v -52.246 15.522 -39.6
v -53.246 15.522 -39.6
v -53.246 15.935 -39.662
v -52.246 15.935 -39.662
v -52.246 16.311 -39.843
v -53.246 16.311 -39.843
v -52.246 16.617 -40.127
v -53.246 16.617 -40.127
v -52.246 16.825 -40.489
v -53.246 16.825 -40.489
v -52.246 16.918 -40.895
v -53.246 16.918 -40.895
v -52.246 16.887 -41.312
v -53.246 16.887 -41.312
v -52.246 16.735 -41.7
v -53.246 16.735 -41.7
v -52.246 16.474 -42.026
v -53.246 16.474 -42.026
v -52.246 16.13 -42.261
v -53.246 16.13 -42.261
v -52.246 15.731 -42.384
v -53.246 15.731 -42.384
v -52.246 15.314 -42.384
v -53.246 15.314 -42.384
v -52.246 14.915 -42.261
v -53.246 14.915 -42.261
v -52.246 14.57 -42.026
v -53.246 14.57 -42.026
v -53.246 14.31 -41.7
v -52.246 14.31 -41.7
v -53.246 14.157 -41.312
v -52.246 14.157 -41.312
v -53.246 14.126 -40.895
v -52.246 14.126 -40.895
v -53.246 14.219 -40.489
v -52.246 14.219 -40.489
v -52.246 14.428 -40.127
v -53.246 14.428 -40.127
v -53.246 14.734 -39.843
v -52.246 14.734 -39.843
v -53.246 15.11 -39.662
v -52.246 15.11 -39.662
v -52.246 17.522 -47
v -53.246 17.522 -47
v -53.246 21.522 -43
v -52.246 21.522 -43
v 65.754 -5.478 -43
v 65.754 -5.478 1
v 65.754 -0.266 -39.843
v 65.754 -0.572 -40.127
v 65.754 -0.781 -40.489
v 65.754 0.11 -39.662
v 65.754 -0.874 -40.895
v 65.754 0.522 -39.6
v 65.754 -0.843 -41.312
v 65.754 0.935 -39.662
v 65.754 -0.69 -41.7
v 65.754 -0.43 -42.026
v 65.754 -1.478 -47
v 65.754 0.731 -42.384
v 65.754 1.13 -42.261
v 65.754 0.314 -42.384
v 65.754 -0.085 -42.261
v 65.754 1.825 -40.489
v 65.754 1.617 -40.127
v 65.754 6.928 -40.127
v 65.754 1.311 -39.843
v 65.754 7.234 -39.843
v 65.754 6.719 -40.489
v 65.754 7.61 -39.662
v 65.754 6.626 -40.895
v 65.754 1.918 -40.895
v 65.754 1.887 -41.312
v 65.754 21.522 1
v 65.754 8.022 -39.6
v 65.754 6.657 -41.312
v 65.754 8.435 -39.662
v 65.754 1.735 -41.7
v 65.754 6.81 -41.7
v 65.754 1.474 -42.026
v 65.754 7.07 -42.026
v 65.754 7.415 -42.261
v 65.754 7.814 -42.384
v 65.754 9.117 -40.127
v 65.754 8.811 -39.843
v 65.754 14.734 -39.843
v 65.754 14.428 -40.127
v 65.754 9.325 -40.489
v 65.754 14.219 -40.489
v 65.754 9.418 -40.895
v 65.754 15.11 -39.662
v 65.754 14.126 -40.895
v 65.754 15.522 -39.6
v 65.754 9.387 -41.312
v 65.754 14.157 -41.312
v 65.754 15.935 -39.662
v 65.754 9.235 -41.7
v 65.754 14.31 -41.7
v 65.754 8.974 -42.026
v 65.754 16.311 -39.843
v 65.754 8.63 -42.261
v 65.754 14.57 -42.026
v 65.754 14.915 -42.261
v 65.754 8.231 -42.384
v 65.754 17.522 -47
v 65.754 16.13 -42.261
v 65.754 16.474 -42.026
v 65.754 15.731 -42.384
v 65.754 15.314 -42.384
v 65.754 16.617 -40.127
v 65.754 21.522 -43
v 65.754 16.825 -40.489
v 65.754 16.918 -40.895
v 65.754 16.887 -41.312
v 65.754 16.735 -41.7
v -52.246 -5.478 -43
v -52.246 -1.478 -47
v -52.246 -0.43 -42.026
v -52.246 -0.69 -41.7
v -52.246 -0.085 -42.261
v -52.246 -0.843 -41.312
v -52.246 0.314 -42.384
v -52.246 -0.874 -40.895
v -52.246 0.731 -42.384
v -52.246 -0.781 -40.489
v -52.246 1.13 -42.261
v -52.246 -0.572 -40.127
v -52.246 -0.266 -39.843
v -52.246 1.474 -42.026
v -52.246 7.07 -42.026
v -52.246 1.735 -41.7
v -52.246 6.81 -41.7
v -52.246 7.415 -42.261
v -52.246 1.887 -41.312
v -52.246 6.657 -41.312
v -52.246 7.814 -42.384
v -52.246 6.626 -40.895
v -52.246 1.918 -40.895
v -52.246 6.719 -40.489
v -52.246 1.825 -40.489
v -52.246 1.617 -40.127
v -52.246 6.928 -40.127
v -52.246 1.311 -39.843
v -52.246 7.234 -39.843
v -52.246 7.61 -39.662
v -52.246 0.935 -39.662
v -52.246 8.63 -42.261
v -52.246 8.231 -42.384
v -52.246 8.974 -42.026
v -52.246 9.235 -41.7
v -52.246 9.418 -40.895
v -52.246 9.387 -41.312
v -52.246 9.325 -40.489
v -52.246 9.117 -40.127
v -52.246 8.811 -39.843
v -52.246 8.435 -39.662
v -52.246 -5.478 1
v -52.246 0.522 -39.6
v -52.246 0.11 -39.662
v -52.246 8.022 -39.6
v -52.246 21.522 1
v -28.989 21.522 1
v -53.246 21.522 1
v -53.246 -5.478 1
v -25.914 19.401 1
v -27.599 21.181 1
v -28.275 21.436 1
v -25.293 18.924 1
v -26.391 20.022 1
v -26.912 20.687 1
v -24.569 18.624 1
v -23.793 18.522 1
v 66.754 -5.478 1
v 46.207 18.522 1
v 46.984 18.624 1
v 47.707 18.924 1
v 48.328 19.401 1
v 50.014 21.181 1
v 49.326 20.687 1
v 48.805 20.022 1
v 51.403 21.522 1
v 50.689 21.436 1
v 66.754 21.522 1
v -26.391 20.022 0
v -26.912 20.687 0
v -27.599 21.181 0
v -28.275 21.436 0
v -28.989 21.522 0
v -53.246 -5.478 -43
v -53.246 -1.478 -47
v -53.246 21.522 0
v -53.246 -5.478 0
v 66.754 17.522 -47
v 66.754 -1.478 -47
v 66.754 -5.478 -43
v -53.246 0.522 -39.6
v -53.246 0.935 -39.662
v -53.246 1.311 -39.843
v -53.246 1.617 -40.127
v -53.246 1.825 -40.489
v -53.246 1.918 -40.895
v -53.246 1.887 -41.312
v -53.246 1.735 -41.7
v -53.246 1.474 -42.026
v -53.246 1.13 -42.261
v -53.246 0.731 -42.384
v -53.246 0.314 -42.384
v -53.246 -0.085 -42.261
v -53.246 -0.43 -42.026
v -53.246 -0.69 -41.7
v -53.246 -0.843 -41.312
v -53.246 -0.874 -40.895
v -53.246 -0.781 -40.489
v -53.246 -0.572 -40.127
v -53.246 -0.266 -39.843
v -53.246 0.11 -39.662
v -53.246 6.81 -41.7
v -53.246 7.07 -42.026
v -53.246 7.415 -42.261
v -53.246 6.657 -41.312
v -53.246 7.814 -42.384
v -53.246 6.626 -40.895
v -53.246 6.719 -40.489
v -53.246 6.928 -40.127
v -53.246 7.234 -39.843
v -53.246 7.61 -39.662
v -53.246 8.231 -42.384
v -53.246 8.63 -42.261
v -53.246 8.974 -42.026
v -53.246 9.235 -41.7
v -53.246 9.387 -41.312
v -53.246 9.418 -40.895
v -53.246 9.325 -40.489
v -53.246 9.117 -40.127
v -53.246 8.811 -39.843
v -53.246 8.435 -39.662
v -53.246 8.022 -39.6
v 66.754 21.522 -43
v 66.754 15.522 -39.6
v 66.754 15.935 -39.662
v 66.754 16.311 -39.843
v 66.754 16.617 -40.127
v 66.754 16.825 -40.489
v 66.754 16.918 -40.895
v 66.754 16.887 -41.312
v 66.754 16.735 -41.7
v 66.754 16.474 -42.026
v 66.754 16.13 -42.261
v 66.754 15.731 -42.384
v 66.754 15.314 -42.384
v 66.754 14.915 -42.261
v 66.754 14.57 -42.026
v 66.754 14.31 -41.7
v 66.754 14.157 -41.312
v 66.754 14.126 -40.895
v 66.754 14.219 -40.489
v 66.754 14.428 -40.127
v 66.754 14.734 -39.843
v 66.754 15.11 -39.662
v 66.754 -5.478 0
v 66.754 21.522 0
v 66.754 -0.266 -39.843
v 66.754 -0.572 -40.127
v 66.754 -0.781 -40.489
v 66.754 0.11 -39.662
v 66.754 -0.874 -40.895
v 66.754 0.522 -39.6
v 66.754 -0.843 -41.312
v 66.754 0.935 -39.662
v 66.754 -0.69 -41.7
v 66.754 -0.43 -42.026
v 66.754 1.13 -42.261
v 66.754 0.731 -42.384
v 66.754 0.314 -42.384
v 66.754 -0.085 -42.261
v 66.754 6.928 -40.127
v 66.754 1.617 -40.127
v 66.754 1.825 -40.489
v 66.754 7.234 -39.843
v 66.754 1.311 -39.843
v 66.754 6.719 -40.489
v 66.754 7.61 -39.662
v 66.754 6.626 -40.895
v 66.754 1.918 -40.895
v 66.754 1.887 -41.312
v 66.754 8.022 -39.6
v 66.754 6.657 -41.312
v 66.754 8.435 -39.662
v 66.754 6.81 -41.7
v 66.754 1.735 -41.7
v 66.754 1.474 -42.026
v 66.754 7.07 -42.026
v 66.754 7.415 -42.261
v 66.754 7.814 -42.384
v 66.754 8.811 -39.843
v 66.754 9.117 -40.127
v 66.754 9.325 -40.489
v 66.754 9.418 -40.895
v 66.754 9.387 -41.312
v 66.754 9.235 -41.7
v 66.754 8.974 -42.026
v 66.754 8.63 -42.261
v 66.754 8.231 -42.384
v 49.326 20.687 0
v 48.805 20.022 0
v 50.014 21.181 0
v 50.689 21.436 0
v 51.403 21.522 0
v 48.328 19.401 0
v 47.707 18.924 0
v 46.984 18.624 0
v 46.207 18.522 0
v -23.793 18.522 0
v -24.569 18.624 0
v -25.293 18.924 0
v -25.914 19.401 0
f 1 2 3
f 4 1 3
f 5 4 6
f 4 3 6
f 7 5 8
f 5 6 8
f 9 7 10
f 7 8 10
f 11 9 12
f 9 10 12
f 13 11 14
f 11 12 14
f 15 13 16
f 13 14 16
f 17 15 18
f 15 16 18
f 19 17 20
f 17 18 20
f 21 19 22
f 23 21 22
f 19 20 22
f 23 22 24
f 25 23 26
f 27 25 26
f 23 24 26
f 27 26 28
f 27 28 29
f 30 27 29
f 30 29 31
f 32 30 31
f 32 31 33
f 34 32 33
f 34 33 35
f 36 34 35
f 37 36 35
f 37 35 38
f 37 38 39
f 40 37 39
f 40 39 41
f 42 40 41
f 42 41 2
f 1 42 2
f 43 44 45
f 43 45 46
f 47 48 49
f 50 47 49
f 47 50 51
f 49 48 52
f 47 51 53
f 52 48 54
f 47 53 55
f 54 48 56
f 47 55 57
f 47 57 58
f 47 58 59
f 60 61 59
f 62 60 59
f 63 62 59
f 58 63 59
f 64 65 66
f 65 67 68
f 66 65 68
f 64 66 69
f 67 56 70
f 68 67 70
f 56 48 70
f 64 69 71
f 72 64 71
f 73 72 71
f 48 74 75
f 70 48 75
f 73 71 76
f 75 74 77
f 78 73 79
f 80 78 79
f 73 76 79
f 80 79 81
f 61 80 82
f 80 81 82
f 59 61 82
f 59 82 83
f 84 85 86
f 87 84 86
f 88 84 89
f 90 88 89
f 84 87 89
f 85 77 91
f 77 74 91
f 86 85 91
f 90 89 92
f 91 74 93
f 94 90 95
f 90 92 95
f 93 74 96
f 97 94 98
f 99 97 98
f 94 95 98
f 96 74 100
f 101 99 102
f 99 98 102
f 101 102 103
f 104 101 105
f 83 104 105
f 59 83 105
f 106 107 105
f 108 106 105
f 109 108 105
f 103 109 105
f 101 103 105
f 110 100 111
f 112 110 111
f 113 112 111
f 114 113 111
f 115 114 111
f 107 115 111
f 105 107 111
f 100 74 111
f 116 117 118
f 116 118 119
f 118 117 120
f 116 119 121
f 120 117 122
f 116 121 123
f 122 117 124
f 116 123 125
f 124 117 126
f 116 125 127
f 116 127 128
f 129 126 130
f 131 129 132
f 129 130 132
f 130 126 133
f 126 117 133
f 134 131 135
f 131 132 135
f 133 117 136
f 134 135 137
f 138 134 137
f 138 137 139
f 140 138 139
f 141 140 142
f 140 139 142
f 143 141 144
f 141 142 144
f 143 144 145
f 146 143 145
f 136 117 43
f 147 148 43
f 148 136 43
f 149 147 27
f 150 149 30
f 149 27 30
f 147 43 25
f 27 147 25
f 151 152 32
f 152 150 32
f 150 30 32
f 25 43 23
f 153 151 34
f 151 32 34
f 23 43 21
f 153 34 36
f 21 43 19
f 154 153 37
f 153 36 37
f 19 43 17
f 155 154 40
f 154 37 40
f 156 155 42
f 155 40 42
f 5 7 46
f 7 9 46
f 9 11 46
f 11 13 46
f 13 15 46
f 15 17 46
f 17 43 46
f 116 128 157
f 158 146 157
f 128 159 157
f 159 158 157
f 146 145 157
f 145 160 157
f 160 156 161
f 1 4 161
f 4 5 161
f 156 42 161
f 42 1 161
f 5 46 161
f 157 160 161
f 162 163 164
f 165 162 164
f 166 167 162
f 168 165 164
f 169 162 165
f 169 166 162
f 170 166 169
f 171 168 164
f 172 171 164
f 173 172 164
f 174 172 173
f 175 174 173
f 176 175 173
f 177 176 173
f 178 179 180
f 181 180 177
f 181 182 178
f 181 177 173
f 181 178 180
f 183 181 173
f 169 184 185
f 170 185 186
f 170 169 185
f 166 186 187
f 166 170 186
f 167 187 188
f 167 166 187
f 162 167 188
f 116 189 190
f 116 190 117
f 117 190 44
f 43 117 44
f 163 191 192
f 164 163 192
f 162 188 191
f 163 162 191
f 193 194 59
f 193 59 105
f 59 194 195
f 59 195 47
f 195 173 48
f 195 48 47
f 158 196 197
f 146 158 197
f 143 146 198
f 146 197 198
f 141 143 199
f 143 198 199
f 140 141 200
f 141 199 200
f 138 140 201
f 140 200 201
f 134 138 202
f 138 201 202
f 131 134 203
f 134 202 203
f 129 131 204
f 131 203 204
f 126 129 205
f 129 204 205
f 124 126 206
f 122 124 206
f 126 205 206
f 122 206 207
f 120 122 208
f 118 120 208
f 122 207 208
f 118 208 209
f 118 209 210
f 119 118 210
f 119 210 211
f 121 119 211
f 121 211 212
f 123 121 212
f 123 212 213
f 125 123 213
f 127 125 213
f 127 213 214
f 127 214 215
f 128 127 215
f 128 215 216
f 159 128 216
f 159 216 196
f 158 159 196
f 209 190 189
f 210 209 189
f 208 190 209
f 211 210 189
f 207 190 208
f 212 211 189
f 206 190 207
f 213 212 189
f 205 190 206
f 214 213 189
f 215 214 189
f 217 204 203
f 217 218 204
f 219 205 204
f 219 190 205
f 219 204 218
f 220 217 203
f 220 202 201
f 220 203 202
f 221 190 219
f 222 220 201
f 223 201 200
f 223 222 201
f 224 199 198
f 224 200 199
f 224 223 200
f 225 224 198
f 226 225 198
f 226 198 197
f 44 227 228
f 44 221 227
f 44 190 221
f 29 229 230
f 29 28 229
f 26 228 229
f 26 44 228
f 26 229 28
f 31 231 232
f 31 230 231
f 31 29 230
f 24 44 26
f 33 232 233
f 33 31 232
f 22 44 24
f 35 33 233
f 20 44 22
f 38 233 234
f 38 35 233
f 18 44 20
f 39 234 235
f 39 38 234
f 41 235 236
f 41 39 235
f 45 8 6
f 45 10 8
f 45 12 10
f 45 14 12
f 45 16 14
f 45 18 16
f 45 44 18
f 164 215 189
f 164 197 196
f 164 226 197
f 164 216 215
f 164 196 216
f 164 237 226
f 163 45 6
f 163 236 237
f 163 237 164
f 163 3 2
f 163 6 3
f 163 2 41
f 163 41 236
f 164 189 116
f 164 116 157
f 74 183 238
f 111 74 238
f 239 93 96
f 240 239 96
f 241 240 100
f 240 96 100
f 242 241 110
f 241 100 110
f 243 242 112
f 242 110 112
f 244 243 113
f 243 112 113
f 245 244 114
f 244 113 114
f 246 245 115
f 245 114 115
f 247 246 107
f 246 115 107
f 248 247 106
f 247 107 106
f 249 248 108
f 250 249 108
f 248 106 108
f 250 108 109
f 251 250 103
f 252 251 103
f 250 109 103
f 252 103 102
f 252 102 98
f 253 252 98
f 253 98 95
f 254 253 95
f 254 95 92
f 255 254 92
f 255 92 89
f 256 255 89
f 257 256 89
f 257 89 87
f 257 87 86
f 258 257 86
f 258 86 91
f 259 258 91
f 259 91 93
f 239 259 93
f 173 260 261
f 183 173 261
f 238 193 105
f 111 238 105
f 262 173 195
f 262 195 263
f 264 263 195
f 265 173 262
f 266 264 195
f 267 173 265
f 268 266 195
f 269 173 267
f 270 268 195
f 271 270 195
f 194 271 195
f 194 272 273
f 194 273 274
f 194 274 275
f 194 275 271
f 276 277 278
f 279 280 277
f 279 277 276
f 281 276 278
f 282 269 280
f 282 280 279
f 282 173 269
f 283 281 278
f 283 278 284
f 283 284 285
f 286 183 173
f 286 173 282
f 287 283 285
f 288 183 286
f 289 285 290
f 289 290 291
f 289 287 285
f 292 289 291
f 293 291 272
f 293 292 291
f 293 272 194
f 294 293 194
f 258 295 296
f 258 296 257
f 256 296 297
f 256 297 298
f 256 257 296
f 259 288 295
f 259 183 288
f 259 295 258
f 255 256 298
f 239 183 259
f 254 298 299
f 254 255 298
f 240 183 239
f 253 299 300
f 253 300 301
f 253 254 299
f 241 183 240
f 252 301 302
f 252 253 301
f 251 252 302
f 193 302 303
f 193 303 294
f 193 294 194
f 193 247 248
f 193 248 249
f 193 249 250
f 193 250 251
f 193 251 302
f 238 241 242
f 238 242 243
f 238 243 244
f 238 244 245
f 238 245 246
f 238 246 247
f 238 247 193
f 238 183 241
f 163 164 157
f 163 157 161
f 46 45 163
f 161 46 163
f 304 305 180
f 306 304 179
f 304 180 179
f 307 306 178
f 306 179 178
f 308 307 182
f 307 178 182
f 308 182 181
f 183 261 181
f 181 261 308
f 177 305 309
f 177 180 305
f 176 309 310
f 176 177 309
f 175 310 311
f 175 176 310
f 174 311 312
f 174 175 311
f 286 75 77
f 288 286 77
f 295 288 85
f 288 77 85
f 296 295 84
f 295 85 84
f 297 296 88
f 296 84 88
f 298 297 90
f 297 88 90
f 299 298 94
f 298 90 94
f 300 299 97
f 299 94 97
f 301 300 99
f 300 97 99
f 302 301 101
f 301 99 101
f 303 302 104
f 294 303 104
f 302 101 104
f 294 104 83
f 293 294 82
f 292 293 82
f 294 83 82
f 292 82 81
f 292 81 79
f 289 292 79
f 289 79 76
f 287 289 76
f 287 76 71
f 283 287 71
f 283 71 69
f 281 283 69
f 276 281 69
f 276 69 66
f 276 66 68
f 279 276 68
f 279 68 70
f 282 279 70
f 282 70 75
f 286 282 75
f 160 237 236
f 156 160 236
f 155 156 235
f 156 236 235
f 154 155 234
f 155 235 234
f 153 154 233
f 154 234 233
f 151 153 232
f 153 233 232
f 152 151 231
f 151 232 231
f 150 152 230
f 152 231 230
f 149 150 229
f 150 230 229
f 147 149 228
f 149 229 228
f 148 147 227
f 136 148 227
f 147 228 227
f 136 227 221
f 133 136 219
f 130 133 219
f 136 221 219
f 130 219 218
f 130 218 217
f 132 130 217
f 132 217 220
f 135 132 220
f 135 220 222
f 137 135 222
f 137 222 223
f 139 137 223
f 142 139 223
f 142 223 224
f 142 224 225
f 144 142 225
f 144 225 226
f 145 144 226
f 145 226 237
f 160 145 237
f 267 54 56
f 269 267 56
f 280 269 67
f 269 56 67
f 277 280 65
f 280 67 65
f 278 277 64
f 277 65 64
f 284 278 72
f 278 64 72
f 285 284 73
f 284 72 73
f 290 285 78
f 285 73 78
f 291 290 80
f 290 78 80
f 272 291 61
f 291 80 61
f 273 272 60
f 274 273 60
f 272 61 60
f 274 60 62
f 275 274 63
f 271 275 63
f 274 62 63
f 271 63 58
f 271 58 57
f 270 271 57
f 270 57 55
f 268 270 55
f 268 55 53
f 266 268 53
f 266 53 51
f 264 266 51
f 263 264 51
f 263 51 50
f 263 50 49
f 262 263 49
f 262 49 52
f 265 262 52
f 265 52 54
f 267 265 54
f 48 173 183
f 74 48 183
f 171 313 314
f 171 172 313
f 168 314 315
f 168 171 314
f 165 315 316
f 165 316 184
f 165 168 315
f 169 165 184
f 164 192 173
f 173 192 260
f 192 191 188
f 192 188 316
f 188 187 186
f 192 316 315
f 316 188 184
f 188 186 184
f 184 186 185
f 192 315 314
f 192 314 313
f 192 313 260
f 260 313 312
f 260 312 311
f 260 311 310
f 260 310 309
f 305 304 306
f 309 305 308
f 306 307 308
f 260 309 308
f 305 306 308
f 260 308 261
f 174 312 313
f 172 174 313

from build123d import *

# Parameters (mm, degrees)
BOSS_EXTRUDE1_DEPTH = 1
SKETCH3_W           = 48
SKETCH3_H           = 27
BASE_FLANGE1_DEPTH  = 1
CHAMFER1_SIZE       = 4
FILLET1_R           = 3
FILLET2_R           = 3
SKETCH8_W           = 48
SKETCH8_H           = 27
BASE_FLANGE2_DEPTH  = 1
CHAMFER2_SIZE       = 4
SKETCH11_R          = 1.4
CUT_EXTRUDE1_DEPTH  = 131.660656096


# Sheet-metal steps are written as plain solids
with BuildPart() as part:
    # Sketch1 → Boss-Extrude1 (new body)
    with BuildSketch(Plane.XY):
        Polygon((-53.246318657, -5.477755158), (66.753681343, -5.477755158), (66.753681343, 21.522244842), (49.207118364, 21.522244842), (49.207118364, 18.522244842), (-26.792881636, 18.522244842), (-26.792881636, 21.522244842), (-53.246318657, 21.522244842), align=None)
    extrude(amount=BOSS_EXTRUDE1_DEPTH)

    # Fillet1
    fillet1_edges = [part.edges().sort_by_distance(p)[0] for p in [
        (-26.792881636, 18.522244842, 0.5),
        (49.207118364, 18.522244842, 0.5),
    ]]
    fillet(fillet1_edges, radius=FILLET1_R - 0.0001)  # a hair under: the kernel refuses the full size

    # Fillet2
    fillet2_edges = [part.edges().sort_by_distance(p)[0] for p in [
        (-26.792881636, 21.522244842, 0.5),
        (49.207118364, 21.522244842, 0.5),
    ]]
    fillet(fillet2_edges, radius=FILLET2_R)


with BuildPart() as body_2:
    # Sketch3 → Base-Flange1 (new body)
    with BuildSketch(Plane(origin=(66.753681343, 0, 0), x_dir=(0, 0, -1), z_dir=(1, 0, 0))):
        with Locations((23, 8.022244842)):
            Rectangle(SKETCH3_W, SKETCH3_H)
    extrude(amount=-BASE_FLANGE1_DEPTH)

    # Chamfer1
    chamfer1_edges = [body_2.edges().sort_by_distance(p)[0] for p in [
        (66.253681343, 21.522244842, -47),
        (66.253681343, -5.477755158, -47),
    ]]
    chamfer(chamfer1_edges, length=CHAMFER1_SIZE)


with BuildPart() as body_3:
    # Sketch8 → Base-Flange2 (new body)
    with BuildSketch(Plane.ZY.offset(53.246318657)):
        with Locations((-23, 8.022244842)):
            Rectangle(SKETCH8_W, SKETCH8_H)
    extrude(amount=-BASE_FLANGE2_DEPTH)

    # Chamfer2
    chamfer2_edges = [body_3.edges().sort_by_distance(p)[0] for p in [
        (-52.746318657, -5.477755158, -47),
        (-52.746318657, 21.522244842, -47),
    ]]
    chamfer(chamfer2_edges, length=CHAMFER2_SIZE)


with BuildPart() as cut_extrude1_tool:
    # Sketch11 → Cut-Extrude1 (new, through all)
    with BuildSketch(Plane.ZY.offset(53.246318657)):
        with Locations((-41, 15.522244842)):
            Circle(SKETCH11_R)
        with Locations((-41, 8.022244842)):
            Circle(SKETCH11_R)
        with Locations((-41, 0.522244842)):
            Circle(SKETCH11_R)
    extrude(amount=-CUT_EXTRUDE1_DEPTH)


with BuildPart() as body_2_1:
    add(body_2.part)

    # Cut-Extrude1: cut by cut_extrude1_tool
    add(cut_extrude1_tool.part, mode=Mode.SUBTRACT)


with BuildPart() as body_3_1:
    add(body_3.part)

    # Cut-Extrude1: cut by cut_extrude1_tool
    add(cut_extrude1_tool.part, mode=Mode.SUBTRACT)


solid = Compound([part.part, body_2_1.part, body_3_1.part])
